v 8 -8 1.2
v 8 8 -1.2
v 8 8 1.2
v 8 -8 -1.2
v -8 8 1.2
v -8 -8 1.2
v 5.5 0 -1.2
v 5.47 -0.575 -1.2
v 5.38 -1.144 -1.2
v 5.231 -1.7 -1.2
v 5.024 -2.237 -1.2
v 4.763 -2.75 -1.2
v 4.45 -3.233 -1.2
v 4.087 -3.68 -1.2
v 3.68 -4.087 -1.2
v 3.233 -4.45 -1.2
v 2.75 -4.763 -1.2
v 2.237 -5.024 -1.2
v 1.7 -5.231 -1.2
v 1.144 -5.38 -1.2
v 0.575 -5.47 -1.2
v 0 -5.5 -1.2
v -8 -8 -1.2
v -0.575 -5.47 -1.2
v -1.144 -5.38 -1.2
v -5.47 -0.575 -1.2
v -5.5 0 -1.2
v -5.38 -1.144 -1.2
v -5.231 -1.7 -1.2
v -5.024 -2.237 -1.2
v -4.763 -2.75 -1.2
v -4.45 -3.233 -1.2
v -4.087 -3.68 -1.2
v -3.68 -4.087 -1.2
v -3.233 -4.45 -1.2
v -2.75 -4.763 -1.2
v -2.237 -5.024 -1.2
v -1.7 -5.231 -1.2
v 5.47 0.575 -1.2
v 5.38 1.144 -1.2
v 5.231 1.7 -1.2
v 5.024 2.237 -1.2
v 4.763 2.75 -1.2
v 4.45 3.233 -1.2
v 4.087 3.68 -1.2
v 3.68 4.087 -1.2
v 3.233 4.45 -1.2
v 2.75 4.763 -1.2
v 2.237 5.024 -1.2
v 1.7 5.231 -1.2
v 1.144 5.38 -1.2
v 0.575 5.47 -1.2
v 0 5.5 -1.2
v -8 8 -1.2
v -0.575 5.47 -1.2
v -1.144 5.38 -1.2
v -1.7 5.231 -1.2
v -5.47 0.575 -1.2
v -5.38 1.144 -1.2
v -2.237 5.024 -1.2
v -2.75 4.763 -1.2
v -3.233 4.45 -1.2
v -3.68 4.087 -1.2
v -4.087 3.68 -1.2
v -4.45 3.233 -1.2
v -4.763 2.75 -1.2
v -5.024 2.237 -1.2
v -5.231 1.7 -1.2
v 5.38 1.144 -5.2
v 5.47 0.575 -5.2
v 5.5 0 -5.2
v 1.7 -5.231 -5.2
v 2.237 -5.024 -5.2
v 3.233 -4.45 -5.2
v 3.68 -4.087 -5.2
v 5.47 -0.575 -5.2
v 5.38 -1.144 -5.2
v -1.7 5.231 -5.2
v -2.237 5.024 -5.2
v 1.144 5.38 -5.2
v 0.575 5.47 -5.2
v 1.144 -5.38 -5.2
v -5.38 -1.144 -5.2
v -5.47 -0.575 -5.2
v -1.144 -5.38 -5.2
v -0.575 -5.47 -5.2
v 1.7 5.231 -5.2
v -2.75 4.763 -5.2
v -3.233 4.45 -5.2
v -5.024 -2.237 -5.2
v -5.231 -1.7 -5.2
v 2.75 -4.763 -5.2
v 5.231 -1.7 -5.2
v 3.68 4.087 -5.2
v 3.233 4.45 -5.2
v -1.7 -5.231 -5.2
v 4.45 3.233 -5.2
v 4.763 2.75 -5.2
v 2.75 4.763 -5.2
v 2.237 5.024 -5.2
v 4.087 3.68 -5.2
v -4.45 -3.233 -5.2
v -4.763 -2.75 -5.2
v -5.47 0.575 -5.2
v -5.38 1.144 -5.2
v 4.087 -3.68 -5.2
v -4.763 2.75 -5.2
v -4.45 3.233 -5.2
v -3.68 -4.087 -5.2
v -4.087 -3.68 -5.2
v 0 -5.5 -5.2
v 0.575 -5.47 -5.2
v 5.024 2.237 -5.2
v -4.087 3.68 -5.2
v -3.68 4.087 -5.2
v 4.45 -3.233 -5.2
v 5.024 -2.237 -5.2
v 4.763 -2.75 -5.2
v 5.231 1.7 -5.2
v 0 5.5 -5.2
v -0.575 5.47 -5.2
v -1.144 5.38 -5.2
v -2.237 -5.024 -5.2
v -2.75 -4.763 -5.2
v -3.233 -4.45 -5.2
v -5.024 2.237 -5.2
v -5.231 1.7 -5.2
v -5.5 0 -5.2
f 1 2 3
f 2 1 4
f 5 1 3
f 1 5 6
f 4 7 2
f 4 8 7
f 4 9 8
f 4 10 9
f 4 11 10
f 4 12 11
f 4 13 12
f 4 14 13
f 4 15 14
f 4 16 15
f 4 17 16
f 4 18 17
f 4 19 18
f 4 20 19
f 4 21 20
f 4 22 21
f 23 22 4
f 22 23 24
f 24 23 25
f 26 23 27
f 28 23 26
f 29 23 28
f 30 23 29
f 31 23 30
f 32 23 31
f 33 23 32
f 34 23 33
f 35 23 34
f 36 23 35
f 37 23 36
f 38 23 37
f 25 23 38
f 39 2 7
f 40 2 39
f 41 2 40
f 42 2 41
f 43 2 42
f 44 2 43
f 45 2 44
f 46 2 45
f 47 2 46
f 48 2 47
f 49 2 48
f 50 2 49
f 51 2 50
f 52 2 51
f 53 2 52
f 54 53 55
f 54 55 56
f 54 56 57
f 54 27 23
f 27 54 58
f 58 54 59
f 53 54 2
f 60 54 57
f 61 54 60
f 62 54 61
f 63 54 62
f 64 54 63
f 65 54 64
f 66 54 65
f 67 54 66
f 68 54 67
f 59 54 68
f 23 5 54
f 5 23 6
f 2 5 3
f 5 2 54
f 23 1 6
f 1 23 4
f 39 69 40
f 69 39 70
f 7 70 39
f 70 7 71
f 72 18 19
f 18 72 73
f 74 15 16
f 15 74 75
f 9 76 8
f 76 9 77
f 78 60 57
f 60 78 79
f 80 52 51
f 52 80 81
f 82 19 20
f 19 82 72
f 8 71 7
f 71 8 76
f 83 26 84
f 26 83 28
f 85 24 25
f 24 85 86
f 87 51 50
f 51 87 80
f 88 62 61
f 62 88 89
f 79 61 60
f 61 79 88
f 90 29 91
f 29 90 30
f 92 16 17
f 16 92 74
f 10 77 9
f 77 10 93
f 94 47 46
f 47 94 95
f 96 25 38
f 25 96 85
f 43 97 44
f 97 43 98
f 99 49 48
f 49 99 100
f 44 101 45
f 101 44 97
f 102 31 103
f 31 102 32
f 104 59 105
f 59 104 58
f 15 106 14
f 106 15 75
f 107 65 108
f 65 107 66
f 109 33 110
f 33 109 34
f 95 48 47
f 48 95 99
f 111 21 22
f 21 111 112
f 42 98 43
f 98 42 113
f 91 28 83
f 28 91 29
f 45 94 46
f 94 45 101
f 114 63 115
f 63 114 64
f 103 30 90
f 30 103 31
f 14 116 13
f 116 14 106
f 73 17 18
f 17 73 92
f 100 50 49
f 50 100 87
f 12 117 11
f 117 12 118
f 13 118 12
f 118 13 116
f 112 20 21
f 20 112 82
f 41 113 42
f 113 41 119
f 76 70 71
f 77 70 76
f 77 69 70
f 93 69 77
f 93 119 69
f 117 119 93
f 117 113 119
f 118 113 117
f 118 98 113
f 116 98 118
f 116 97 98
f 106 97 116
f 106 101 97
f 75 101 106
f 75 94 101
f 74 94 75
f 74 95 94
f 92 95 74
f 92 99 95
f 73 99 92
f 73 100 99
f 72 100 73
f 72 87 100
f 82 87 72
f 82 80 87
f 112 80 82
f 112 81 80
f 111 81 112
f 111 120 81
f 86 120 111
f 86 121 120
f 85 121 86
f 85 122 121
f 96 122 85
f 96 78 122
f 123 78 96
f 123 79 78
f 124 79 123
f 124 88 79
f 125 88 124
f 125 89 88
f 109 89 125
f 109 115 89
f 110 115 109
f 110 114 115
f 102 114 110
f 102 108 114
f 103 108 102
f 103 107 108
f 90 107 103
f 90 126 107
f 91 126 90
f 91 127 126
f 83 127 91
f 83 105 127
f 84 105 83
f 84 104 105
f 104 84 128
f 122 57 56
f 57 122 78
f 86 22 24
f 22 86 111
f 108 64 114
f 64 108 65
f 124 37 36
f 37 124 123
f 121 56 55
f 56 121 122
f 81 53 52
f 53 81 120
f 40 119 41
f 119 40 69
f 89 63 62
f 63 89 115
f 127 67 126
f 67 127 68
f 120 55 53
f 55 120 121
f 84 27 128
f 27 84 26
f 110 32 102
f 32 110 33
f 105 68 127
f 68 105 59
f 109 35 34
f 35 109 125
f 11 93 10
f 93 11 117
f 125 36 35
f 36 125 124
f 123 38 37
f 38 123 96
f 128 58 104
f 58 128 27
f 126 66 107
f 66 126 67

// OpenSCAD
// Press-fit end cap for 15 mm extrusion.
$fn = 60;
eps = 0.02;
profile = 15;
cap_t = 2.4;
wall = 2;
pin_d = profile - 2 * wall;
pin_l = 4;
union() {
    cube([profile + 1, profile + 1, cap_t], center = true);
    translate([0, 0, -cap_t / 2 - pin_l]) cylinder(d = pin_d, h = pin_l + eps);
}
